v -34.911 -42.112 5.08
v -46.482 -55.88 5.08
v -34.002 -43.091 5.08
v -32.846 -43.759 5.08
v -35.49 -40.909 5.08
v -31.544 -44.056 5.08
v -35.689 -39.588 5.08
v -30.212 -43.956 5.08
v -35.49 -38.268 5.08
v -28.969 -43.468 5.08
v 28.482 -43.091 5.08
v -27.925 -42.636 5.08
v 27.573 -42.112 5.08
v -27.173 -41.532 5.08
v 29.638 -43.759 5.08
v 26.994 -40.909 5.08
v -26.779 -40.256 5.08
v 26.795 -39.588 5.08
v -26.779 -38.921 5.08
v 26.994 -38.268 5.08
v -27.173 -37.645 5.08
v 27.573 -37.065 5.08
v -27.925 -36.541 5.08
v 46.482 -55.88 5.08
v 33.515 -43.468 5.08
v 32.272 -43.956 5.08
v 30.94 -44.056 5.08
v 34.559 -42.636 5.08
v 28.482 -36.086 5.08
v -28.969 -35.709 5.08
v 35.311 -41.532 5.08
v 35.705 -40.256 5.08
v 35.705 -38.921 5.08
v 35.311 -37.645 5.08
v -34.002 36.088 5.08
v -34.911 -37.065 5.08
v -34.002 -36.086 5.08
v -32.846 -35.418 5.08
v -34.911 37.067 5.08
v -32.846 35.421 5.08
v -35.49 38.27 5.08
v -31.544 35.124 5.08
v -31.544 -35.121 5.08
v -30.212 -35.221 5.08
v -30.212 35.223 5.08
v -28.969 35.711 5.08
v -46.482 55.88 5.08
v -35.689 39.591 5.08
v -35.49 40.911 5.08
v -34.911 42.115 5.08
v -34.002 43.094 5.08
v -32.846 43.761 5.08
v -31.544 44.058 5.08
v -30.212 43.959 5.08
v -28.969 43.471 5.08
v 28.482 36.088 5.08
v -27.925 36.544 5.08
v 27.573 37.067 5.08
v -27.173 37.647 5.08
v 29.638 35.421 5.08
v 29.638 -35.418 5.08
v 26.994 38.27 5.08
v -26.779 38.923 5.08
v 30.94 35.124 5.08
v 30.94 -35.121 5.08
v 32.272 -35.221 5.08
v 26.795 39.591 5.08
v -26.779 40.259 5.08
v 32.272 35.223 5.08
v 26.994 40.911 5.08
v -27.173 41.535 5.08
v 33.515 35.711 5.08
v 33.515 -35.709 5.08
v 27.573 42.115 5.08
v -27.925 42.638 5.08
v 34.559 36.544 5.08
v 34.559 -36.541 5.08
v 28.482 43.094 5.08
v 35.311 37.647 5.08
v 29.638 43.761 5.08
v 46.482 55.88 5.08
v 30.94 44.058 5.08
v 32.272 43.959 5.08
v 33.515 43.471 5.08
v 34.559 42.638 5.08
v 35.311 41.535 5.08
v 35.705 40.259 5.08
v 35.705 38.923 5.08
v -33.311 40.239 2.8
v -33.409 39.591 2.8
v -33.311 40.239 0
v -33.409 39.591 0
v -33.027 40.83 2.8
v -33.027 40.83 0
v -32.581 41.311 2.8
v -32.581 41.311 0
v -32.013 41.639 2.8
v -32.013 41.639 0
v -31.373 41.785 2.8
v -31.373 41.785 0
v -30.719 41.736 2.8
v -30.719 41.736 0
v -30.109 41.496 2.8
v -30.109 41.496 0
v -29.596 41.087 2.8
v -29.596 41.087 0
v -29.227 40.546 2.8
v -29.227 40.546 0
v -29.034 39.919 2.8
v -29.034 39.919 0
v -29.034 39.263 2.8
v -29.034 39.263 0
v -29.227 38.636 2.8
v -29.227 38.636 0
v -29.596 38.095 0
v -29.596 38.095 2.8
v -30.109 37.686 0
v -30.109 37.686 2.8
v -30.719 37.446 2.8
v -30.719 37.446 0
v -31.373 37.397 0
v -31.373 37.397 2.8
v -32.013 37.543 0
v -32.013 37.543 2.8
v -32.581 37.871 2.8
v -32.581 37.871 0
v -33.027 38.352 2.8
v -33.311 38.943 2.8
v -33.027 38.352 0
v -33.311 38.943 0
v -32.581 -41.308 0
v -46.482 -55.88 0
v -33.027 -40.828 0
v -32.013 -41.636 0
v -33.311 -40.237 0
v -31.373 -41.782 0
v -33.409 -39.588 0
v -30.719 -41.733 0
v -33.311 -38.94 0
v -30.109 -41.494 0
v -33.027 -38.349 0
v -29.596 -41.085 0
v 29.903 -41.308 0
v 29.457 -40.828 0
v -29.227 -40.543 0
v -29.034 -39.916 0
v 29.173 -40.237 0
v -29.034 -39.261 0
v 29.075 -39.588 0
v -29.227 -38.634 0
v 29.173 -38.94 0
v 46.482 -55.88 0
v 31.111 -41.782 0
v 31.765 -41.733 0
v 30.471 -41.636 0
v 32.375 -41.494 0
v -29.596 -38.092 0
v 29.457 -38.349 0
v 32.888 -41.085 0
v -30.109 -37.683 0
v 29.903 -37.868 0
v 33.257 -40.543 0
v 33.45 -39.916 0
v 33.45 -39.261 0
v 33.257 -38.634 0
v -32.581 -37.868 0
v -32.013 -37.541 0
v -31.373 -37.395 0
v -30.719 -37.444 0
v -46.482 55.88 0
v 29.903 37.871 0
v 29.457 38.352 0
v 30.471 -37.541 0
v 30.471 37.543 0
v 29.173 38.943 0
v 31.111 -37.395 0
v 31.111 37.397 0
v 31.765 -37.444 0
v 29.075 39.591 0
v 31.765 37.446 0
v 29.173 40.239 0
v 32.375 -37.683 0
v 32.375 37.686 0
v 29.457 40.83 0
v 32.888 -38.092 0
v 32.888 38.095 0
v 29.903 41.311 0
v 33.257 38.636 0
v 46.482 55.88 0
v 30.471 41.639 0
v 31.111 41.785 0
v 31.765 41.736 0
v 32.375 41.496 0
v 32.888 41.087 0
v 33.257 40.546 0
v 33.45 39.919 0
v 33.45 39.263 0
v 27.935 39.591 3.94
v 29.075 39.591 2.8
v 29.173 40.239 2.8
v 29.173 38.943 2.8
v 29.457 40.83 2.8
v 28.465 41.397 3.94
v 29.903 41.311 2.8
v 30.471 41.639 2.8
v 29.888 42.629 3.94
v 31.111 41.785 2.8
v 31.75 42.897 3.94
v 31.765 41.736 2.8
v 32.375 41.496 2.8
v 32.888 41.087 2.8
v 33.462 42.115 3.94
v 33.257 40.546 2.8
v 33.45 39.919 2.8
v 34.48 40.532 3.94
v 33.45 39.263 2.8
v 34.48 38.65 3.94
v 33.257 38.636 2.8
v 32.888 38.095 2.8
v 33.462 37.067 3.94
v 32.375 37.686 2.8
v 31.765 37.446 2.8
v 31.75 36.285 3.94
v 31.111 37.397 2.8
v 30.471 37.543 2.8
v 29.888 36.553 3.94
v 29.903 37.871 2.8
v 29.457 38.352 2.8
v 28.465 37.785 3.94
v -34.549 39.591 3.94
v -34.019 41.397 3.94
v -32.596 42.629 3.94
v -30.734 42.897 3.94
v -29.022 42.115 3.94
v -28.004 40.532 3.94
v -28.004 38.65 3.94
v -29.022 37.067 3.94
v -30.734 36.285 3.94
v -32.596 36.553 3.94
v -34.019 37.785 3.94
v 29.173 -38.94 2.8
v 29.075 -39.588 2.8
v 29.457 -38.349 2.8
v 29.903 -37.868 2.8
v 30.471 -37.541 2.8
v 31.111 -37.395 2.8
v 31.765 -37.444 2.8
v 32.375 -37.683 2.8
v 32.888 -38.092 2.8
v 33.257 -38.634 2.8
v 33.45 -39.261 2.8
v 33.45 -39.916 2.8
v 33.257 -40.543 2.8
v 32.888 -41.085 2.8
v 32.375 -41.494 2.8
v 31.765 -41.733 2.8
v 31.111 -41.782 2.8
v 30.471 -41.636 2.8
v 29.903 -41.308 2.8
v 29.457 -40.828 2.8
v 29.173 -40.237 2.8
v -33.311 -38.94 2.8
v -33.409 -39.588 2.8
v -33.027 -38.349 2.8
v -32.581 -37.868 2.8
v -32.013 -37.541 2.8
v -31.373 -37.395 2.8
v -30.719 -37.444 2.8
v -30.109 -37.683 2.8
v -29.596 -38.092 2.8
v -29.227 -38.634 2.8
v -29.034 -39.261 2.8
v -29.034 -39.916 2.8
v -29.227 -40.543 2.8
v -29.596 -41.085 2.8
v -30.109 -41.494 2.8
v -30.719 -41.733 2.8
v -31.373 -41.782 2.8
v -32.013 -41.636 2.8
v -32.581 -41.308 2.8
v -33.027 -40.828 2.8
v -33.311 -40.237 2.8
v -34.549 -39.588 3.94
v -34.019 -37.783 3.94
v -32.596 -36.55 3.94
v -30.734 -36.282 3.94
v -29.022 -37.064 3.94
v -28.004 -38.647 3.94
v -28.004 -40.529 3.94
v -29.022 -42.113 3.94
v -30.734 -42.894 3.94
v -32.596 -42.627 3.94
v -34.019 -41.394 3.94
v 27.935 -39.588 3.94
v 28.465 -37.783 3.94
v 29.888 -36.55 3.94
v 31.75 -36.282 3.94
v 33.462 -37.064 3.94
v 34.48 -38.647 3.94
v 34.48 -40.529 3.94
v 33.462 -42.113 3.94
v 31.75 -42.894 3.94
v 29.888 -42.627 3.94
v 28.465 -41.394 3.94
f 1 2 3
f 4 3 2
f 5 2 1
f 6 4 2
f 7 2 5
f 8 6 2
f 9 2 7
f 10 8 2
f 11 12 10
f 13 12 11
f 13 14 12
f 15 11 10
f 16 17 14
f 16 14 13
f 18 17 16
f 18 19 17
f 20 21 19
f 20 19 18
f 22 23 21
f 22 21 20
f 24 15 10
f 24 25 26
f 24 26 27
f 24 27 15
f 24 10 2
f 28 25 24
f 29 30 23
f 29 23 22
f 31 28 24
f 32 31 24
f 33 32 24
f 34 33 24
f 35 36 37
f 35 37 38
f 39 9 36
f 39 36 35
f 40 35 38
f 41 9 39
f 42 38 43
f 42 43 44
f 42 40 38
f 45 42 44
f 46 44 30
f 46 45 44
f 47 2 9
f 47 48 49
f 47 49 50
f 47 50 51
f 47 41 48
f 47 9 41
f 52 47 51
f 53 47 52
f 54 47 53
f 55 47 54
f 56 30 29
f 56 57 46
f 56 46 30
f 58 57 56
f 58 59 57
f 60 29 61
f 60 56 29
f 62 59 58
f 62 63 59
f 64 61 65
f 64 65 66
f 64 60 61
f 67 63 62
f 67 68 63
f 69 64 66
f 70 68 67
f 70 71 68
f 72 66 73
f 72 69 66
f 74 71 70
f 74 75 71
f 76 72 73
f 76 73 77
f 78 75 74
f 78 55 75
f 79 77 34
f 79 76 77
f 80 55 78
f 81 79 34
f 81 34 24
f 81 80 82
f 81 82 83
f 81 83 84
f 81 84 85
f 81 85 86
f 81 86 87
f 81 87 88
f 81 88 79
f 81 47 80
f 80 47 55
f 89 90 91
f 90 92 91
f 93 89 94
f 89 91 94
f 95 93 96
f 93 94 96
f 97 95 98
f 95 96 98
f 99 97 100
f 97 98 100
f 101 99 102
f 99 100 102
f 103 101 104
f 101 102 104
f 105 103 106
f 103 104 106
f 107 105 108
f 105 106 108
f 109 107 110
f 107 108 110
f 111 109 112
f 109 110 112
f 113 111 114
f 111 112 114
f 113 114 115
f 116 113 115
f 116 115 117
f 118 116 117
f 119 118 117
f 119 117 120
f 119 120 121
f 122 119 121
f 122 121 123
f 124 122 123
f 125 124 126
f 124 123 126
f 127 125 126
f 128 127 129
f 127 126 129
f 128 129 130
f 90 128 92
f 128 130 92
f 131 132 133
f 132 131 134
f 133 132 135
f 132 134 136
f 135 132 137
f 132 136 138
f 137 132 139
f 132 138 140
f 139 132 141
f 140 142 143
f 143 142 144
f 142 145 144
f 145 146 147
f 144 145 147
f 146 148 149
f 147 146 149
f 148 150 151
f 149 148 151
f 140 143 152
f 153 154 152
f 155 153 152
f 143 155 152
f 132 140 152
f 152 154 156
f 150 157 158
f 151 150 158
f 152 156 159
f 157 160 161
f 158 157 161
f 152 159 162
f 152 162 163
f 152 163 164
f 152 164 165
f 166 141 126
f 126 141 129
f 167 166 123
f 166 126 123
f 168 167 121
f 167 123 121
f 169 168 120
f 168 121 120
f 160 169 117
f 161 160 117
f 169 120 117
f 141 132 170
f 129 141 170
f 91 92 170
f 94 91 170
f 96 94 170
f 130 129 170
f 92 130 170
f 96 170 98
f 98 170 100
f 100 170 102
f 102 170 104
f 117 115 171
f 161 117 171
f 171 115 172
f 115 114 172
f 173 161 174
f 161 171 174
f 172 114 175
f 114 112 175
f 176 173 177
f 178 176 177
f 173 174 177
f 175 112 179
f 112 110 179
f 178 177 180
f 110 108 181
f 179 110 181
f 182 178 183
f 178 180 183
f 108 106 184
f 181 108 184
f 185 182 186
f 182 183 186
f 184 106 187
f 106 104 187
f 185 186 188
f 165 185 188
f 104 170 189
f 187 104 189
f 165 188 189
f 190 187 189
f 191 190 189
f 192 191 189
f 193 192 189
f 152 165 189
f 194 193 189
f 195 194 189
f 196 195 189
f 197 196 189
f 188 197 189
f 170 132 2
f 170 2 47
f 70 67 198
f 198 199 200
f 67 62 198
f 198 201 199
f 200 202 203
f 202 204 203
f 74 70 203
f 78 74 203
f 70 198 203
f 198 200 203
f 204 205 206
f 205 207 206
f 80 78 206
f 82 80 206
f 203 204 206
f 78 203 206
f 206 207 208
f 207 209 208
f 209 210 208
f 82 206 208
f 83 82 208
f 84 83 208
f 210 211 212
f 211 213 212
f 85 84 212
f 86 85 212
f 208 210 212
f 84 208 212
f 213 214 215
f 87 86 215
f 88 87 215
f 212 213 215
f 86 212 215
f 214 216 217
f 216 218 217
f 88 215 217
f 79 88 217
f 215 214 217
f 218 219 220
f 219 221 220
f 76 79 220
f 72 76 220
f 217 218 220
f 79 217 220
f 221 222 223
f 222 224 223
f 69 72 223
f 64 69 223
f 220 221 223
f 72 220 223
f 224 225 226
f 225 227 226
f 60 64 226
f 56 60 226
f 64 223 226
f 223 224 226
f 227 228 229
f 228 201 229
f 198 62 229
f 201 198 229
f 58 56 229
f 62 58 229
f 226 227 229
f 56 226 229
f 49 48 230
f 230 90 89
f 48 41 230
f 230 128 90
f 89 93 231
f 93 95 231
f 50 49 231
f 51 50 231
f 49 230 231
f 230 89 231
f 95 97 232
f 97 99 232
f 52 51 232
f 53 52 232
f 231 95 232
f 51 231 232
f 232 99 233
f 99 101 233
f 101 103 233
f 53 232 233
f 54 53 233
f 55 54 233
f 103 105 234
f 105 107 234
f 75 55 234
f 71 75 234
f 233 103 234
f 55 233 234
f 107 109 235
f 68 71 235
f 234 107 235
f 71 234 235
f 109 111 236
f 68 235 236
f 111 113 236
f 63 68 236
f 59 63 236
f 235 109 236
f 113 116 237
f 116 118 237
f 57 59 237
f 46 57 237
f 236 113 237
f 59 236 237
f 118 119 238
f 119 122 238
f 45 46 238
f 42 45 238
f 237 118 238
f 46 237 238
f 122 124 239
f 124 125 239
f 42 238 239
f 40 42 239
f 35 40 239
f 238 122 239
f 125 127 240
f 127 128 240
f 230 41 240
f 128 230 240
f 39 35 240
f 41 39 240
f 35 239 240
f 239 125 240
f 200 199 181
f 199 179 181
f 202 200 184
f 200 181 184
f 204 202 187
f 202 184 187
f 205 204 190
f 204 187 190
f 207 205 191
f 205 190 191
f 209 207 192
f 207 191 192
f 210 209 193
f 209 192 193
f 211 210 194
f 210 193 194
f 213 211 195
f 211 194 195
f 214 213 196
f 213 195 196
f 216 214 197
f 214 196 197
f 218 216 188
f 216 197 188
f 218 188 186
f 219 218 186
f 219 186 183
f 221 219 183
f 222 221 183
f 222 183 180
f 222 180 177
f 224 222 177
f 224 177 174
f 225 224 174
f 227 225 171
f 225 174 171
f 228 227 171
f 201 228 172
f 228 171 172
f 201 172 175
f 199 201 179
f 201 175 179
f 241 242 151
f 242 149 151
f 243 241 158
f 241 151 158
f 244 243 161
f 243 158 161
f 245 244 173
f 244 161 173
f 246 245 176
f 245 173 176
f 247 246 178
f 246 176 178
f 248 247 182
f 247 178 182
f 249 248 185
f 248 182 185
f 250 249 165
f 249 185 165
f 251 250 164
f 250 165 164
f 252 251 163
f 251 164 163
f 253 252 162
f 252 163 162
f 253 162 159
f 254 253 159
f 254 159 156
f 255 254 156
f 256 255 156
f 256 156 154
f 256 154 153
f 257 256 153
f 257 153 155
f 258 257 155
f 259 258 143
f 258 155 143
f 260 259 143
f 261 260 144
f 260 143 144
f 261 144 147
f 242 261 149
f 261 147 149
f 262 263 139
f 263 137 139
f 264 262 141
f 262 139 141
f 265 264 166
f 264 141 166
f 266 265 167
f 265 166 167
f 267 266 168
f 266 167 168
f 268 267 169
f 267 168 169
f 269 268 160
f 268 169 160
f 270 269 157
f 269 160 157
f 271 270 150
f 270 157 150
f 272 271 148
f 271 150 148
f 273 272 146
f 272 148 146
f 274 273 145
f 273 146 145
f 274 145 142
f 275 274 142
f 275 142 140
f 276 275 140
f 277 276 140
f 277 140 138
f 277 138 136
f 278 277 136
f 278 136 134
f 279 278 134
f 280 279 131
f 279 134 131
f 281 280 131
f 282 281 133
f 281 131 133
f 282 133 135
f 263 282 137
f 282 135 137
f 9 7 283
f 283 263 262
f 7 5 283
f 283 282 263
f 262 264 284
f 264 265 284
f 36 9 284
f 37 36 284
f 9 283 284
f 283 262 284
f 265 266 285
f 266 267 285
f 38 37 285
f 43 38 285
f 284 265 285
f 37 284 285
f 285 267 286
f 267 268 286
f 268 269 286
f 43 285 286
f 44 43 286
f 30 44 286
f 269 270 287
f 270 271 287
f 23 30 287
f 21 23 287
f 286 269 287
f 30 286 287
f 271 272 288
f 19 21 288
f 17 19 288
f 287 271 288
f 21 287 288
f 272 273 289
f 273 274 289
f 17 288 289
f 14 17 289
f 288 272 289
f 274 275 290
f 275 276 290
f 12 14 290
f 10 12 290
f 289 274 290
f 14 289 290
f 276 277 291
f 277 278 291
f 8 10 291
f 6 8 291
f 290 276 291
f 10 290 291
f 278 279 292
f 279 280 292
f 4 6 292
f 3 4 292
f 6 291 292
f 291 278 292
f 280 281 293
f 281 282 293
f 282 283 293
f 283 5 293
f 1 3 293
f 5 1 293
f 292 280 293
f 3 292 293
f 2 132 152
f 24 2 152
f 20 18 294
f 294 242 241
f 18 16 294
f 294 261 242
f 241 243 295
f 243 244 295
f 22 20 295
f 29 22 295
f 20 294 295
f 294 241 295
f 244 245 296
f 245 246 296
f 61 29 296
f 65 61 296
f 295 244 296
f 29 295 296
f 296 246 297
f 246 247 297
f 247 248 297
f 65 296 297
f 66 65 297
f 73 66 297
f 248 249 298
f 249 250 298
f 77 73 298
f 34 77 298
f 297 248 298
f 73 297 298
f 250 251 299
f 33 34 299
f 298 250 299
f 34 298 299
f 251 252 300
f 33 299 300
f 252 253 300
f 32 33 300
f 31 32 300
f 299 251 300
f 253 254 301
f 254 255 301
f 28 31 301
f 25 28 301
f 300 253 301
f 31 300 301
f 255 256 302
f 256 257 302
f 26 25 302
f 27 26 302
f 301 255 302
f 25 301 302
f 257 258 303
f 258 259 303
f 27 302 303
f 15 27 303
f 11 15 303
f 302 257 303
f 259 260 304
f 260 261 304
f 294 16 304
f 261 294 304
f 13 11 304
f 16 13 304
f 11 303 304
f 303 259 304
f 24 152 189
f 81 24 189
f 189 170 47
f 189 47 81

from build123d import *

# Parameters (mm, degrees)
F0_W           = 92.964
F0_H           = 111.76
F1_DEPTH       = 5.08
F3_D           = 4.4
F3_DEPTH       = 37.1856
F3_CSINK_D     = 8.96
F3_CSINK_ANGLE = 90
F3_TIP         = 1.3218933619


with BuildPart() as f1:
    # F0 (on Top) → F1 (new body)
    with BuildSketch(Plane.XY):
        Rectangle(F0_W, F0_H)
    extrude(amount=F1_DEPTH)

    # F3
    with Locations(Plane.XY.offset(5.08)):
        with Locations((-31.20898, 39.59098), (-31.20898, -39.58844), (31.27502, -39.58844), (31.27502, 39.59098)):
            CounterSinkHole(F3_D / 2, F3_CSINK_D / 2, depth=F3_DEPTH, counter_sink_angle=F3_CSINK_ANGLE)
            with Locations((0, 0, -(F3_DEPTH + F3_TIP / 2))):  # 118° drill point
                Cone(0, F3_D / 2, F3_TIP, mode=Mode.SUBTRACT)


solid = f1.part
